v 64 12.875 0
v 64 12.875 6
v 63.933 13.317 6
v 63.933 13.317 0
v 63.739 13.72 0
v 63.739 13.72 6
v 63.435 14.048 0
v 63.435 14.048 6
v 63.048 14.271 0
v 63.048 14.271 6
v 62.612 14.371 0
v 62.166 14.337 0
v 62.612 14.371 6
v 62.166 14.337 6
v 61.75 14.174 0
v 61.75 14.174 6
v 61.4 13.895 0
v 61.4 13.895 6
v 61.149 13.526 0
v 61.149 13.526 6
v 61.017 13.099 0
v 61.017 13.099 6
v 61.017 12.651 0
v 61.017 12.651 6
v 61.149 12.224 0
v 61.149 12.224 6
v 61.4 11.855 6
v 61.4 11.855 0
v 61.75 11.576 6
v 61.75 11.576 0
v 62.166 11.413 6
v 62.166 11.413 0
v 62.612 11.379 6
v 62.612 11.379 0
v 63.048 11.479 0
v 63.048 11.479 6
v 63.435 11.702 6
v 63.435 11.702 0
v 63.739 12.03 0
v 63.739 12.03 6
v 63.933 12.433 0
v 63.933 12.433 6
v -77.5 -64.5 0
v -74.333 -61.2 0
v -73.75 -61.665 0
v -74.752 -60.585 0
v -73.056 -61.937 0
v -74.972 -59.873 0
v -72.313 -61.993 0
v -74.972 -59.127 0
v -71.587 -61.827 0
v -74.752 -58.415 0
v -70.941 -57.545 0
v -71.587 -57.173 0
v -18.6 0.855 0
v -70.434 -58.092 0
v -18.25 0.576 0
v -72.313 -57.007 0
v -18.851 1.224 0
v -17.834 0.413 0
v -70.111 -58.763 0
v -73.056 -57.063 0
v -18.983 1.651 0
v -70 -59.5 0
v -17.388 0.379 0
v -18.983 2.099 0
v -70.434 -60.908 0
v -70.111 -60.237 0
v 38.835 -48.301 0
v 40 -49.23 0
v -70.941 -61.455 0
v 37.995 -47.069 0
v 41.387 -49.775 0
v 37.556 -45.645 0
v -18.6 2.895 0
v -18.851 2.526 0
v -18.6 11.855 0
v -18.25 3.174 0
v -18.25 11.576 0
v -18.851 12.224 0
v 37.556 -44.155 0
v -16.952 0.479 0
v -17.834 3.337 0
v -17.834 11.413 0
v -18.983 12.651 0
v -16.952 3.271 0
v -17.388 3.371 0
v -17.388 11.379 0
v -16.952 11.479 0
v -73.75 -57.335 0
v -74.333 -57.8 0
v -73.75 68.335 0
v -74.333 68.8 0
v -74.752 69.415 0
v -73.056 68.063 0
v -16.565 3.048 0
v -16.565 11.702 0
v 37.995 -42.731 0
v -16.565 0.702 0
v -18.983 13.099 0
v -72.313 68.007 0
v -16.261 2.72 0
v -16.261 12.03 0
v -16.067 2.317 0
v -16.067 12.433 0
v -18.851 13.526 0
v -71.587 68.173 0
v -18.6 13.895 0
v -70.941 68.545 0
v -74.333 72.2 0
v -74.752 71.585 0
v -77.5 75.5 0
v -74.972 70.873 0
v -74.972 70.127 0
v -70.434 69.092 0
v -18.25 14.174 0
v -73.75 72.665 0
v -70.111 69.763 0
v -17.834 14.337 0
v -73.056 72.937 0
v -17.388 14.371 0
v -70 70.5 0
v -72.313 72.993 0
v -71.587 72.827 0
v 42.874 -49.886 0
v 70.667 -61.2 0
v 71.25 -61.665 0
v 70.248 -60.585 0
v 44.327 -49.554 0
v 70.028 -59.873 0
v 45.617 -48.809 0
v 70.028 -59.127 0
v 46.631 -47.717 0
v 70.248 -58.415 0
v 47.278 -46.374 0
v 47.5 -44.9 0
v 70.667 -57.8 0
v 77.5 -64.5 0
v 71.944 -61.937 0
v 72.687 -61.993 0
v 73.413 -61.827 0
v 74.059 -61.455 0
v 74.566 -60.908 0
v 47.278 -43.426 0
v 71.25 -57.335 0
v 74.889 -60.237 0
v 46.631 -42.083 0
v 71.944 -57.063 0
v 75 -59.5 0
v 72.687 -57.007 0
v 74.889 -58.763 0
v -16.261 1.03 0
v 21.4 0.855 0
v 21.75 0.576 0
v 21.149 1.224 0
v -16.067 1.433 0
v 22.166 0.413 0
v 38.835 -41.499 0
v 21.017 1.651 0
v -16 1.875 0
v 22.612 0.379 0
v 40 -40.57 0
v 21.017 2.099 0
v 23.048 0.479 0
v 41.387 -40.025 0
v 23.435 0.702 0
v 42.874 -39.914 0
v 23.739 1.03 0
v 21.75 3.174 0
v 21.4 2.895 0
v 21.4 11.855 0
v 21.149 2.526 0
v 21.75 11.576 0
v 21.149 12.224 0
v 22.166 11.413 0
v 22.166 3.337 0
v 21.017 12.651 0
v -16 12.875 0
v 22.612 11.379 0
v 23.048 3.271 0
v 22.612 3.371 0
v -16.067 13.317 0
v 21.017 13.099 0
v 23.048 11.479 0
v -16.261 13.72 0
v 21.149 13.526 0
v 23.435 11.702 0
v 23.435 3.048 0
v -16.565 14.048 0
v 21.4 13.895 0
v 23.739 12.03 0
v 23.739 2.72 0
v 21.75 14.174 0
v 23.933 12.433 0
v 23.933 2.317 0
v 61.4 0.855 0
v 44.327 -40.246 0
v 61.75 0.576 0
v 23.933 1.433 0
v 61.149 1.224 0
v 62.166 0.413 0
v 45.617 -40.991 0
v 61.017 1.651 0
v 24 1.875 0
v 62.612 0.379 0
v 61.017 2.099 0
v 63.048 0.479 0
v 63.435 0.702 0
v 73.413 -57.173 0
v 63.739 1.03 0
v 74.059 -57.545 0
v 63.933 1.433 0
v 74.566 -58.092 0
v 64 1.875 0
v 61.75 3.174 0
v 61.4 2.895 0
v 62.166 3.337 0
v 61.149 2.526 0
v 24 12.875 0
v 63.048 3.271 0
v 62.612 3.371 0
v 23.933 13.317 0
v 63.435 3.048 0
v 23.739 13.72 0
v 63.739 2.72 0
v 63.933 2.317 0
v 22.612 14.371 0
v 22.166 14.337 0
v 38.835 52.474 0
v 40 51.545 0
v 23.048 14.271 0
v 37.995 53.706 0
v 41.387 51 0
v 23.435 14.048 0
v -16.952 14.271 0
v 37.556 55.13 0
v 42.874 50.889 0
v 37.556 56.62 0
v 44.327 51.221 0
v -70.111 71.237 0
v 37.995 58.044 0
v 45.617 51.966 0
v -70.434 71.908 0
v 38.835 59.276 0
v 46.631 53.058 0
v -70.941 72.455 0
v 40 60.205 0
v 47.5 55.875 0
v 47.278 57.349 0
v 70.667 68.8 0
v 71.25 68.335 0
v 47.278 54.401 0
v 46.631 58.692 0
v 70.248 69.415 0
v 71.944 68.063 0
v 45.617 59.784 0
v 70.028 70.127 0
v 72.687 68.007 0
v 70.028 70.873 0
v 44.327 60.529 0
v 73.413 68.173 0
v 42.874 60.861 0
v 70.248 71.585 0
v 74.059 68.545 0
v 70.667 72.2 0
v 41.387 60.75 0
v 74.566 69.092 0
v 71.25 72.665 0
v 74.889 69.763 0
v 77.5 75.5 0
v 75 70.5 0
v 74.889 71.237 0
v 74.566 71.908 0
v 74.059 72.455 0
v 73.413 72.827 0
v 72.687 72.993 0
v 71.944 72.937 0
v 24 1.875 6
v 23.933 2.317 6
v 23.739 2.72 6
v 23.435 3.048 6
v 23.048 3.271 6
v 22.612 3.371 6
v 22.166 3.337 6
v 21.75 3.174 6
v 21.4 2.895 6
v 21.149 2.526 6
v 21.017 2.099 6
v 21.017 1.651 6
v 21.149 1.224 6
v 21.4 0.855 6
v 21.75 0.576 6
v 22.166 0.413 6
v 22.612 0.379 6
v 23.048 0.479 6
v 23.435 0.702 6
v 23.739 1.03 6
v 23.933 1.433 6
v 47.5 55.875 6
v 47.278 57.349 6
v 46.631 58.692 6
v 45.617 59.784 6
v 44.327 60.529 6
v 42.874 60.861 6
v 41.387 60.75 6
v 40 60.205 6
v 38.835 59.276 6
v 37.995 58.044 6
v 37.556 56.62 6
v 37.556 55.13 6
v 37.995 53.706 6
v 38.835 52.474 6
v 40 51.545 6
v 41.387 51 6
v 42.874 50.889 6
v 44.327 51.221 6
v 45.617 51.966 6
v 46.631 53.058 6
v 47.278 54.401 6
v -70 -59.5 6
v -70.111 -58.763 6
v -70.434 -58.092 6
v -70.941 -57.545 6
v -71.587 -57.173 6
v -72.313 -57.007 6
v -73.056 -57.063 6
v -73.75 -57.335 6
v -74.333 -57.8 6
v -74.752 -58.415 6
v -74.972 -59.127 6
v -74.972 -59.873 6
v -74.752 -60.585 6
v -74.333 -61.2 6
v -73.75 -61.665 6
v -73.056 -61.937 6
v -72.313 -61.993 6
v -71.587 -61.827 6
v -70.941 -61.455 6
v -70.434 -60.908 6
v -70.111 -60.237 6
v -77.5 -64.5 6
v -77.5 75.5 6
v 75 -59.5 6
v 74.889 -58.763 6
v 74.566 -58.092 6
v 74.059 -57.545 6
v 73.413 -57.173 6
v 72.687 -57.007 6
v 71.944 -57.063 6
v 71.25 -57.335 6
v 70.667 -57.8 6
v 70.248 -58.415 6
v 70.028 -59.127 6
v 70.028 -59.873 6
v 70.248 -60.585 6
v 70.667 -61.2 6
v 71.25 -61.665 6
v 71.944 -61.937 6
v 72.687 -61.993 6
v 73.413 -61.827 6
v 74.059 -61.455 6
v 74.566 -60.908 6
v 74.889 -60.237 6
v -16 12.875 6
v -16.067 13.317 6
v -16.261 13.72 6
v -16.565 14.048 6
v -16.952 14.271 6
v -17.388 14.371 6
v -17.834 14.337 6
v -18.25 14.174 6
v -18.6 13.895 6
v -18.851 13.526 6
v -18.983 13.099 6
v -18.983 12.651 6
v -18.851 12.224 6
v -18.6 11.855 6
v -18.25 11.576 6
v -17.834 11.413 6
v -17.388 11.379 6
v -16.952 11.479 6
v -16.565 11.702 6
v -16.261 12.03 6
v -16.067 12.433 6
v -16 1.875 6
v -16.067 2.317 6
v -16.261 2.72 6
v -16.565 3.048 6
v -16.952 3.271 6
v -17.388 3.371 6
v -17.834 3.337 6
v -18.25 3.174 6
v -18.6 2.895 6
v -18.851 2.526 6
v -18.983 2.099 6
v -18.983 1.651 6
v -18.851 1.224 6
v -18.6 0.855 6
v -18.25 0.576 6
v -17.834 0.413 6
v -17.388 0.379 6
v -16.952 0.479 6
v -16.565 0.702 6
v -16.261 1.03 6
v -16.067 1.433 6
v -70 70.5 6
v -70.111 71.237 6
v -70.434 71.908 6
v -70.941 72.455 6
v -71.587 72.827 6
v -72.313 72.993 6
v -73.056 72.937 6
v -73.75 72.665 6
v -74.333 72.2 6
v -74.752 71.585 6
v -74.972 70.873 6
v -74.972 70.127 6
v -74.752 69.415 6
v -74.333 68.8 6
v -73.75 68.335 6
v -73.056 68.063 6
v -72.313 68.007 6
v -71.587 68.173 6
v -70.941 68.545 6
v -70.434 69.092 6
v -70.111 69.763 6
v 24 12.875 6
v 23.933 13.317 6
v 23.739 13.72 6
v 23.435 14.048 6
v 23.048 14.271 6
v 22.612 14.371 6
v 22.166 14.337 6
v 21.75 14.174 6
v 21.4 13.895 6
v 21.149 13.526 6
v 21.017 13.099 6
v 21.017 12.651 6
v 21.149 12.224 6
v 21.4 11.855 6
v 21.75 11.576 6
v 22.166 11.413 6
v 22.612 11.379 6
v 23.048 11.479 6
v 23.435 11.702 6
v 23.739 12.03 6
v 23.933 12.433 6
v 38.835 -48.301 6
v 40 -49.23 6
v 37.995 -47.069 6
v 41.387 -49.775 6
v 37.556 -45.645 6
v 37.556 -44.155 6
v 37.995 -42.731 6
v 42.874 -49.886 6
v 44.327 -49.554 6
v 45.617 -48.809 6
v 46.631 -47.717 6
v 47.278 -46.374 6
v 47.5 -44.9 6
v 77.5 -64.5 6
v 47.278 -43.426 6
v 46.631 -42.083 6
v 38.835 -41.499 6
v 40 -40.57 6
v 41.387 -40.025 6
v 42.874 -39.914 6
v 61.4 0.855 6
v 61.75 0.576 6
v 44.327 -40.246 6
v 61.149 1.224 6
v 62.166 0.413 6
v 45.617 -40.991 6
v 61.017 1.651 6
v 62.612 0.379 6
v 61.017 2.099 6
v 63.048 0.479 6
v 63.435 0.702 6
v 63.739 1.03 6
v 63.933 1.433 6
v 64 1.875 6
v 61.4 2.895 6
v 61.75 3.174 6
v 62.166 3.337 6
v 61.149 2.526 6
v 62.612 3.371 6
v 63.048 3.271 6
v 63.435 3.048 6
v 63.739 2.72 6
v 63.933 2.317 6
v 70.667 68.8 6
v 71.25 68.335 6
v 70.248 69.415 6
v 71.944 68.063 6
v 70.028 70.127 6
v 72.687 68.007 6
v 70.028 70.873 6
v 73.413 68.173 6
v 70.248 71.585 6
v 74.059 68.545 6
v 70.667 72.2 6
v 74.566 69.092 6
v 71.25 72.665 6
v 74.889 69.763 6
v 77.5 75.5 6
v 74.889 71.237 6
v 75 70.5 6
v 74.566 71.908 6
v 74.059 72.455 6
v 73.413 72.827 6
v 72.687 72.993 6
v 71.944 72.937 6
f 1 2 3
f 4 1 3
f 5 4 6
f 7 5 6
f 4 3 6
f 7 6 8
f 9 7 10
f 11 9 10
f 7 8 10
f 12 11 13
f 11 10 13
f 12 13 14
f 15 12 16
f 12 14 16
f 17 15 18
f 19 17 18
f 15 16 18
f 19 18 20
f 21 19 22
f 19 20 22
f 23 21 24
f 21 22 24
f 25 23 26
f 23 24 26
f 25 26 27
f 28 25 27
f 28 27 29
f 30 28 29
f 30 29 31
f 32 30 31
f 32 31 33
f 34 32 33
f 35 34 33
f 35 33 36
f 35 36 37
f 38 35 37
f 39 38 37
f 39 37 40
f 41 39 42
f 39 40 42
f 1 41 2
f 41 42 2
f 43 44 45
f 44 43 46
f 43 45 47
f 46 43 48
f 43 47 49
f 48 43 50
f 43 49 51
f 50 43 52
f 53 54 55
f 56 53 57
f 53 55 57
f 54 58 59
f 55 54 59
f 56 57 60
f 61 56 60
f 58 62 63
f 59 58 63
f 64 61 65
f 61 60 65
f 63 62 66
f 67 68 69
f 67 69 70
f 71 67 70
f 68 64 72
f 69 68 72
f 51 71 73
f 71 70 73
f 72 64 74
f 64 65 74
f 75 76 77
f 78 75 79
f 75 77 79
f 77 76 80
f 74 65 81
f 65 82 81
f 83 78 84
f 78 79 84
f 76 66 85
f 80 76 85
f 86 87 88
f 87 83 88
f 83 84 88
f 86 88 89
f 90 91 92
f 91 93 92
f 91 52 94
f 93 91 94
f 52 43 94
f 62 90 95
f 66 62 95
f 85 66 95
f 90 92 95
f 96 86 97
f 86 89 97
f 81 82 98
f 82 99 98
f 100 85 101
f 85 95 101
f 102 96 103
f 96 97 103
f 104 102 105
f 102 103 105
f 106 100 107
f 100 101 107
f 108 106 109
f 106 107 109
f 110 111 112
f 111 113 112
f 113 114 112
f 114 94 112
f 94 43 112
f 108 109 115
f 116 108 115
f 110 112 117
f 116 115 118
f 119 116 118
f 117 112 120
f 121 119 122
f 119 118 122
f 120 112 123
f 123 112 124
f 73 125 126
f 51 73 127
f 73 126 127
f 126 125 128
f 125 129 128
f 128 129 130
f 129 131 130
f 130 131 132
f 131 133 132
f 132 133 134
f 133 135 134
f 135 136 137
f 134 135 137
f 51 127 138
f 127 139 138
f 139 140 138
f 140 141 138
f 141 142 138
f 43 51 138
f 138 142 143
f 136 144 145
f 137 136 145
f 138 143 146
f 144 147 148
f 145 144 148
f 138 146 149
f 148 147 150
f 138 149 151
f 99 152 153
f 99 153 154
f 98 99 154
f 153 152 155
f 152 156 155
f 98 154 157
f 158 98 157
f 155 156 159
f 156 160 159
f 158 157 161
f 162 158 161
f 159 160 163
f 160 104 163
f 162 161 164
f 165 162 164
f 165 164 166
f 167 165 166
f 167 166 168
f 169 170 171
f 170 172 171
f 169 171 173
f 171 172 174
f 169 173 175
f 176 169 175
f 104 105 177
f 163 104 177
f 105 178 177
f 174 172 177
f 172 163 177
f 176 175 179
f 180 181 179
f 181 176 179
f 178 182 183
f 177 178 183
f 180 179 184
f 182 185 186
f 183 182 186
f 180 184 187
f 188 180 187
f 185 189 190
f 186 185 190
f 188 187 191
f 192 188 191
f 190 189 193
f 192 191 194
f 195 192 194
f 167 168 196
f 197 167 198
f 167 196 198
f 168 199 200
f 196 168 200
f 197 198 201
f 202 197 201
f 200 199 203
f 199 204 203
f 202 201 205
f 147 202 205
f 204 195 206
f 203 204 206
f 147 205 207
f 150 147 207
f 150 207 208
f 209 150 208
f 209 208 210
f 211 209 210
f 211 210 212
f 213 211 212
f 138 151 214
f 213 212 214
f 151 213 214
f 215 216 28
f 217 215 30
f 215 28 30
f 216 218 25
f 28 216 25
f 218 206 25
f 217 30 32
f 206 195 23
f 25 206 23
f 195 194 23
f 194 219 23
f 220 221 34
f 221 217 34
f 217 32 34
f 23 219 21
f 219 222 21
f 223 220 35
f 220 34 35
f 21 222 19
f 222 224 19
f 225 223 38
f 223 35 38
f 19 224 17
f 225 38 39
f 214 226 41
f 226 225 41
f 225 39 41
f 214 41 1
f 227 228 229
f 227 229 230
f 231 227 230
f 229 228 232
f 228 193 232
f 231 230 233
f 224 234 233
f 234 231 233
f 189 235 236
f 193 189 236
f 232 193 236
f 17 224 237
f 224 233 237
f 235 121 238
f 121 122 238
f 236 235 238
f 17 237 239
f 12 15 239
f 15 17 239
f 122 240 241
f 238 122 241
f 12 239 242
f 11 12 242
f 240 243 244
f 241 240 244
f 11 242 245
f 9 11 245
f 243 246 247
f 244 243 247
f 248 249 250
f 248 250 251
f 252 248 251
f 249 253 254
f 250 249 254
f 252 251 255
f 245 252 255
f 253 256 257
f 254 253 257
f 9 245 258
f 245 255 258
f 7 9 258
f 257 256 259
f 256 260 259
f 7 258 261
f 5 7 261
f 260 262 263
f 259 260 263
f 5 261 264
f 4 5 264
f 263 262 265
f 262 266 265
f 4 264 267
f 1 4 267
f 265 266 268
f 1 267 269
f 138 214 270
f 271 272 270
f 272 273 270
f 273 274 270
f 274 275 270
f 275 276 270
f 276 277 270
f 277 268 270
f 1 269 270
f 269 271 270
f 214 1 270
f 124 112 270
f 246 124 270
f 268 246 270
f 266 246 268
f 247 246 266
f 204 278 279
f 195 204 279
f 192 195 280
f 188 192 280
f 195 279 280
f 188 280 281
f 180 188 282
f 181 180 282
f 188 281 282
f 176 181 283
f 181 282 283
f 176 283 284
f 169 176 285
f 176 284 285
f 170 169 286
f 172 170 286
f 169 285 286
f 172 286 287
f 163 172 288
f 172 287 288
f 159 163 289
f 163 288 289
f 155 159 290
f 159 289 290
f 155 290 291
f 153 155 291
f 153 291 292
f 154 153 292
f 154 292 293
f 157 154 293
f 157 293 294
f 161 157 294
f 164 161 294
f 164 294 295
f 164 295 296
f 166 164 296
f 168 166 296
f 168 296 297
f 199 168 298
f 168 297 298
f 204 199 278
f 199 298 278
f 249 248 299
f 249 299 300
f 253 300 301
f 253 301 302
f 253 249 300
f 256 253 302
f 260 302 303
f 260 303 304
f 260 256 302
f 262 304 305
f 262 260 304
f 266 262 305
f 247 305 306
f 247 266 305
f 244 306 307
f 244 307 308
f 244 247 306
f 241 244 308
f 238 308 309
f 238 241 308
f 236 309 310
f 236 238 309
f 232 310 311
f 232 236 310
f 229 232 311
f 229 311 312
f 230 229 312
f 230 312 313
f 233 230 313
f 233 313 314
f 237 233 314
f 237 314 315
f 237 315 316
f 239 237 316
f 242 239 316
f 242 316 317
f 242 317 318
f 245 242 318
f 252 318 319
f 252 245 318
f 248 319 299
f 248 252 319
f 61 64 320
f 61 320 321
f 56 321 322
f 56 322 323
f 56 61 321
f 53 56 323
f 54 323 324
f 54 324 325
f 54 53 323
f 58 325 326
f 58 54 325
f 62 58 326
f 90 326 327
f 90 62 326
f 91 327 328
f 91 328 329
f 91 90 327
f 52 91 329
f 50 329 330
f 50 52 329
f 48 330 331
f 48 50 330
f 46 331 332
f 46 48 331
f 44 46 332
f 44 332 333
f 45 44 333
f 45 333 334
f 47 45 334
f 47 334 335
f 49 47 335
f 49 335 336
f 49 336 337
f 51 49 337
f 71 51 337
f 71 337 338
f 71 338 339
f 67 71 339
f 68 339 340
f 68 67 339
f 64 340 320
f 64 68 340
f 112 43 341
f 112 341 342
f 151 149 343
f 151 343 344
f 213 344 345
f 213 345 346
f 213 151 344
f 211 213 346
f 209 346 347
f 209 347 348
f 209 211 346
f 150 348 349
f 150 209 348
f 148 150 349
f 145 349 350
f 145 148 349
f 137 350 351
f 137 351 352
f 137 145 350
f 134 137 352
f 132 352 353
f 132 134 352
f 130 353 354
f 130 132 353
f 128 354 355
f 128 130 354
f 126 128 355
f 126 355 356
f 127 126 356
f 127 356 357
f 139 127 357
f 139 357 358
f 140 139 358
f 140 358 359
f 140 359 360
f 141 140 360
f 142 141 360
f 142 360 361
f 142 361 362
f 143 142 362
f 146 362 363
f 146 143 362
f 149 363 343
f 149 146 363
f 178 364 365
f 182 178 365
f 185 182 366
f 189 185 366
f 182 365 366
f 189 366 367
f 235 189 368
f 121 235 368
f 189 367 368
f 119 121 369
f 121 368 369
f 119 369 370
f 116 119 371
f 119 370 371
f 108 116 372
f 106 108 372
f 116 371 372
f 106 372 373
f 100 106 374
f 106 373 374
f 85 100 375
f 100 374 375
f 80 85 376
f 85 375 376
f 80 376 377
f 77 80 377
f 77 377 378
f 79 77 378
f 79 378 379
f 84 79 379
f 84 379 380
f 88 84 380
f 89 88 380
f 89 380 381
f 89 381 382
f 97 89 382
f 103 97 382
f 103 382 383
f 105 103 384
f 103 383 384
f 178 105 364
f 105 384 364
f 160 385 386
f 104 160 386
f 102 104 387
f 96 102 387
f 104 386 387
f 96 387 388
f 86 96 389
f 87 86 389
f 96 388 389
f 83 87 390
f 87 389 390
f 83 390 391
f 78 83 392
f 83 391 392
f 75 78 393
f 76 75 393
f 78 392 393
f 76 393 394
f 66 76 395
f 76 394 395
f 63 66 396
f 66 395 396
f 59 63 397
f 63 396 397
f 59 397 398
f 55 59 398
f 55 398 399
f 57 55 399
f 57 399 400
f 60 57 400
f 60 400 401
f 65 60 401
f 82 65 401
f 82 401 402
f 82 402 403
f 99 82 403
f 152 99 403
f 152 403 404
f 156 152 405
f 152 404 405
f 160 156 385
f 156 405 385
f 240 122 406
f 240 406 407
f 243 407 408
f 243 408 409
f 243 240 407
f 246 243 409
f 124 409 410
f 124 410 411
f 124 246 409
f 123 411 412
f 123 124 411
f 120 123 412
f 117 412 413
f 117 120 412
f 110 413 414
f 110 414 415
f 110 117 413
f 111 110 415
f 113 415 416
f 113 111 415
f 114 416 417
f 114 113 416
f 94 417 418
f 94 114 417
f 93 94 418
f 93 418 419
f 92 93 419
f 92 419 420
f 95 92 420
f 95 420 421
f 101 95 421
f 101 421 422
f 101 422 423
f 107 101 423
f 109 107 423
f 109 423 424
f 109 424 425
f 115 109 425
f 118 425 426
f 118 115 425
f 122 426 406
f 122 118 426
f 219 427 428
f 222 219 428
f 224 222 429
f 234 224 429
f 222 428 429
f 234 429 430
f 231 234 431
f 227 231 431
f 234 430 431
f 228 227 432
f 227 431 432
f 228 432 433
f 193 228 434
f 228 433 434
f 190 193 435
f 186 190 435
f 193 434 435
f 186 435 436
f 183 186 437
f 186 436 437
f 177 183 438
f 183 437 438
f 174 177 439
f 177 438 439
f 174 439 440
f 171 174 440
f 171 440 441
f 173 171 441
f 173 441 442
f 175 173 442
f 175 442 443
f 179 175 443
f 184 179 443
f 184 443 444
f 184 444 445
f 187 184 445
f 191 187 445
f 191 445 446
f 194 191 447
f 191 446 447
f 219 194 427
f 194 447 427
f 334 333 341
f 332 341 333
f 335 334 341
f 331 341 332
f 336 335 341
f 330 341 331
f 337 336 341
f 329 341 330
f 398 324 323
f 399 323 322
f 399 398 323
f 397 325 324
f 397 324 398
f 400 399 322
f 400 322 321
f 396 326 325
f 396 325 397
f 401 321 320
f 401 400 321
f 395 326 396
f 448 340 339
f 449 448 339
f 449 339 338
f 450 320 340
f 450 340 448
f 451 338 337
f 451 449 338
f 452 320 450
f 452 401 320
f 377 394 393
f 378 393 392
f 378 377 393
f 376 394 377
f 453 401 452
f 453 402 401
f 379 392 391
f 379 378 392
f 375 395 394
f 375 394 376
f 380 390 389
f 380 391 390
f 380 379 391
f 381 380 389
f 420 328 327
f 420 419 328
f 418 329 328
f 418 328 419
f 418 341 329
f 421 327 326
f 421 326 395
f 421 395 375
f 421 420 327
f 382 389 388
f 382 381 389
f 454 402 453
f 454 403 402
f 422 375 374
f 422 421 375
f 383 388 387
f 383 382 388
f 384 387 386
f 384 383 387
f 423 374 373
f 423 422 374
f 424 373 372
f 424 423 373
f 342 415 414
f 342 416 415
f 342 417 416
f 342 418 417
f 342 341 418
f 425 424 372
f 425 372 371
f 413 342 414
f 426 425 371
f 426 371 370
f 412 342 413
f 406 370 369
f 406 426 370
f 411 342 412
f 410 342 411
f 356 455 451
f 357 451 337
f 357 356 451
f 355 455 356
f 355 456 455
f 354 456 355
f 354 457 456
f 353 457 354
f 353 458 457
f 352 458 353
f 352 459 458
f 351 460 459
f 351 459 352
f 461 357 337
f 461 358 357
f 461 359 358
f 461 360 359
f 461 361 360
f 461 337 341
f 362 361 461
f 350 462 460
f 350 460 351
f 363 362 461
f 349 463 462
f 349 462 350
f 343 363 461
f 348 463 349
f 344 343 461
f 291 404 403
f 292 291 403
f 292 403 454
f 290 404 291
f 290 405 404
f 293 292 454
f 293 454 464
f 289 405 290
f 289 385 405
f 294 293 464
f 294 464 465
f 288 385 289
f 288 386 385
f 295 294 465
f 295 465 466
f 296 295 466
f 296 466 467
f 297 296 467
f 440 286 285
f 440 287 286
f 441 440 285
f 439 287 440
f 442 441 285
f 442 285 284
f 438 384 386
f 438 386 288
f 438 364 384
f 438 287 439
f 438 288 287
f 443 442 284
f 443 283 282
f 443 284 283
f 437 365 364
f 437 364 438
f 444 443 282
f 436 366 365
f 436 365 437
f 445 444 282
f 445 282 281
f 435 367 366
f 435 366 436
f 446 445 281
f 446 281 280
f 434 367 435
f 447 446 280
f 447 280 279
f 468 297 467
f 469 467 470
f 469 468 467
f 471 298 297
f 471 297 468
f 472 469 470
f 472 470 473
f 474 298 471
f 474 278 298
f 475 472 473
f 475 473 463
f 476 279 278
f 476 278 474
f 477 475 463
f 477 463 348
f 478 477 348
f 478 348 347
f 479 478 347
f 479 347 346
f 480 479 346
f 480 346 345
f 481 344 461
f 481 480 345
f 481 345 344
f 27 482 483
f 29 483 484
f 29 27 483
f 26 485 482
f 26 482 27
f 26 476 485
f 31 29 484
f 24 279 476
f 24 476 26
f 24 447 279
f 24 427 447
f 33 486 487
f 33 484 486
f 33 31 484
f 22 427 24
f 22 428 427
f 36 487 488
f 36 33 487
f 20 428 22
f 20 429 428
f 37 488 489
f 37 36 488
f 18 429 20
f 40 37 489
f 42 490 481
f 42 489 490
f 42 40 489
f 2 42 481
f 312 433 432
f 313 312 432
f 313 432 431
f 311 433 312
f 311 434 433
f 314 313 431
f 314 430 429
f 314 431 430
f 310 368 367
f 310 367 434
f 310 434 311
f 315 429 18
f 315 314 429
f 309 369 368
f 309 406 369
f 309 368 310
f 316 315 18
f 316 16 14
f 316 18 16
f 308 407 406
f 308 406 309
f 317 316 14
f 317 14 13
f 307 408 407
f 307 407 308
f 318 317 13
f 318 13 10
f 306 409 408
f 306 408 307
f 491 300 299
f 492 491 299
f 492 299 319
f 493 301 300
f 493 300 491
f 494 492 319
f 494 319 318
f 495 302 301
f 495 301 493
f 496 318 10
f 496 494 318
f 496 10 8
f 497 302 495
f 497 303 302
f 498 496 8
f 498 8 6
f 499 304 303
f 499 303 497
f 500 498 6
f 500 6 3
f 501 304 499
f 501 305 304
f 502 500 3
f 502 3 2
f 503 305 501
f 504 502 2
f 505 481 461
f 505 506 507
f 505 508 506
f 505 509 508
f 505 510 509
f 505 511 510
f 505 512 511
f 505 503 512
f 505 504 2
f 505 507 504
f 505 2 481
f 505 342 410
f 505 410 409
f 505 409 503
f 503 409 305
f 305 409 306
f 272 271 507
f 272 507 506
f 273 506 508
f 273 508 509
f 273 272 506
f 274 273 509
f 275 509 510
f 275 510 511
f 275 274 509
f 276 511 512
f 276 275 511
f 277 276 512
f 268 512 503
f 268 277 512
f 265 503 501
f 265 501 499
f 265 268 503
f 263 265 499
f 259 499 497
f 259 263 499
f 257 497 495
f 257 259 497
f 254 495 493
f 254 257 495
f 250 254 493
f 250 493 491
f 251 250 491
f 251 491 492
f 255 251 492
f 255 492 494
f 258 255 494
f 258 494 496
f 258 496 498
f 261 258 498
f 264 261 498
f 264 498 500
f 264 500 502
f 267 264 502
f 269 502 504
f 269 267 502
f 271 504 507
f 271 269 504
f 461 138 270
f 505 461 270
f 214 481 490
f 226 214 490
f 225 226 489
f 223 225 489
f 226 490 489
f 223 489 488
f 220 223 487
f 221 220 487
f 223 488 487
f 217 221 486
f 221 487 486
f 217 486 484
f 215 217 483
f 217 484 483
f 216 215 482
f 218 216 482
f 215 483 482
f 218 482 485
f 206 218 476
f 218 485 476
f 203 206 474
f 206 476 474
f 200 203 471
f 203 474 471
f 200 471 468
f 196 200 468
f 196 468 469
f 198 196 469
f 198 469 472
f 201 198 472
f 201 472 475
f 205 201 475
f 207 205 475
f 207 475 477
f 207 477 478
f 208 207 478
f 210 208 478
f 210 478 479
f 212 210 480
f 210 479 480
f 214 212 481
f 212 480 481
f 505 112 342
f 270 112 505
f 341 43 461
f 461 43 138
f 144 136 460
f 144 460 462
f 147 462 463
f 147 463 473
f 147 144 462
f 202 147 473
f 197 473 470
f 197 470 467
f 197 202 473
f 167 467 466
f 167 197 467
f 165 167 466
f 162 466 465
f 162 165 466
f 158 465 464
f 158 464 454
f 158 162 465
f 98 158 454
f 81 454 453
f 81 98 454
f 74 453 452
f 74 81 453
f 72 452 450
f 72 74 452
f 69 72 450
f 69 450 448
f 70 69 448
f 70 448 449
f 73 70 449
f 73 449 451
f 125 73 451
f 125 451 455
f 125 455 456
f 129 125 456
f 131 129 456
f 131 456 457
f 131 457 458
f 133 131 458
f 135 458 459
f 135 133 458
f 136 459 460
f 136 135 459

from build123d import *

# Parameters (mm, degrees)
ESQUISSE1_W             = 155
ESQUISSE1_H             = 140
ESQUISSE1_R             = 5
ESQUISSE1_R_2           = 2.5
BOSS_EXTRU_1_DEPTH      = 6
ESQUISSE6_R             = 1.5
ENL_V_MAT_EXTRU_1_DEPTH = 6


with BuildPart() as part:
    # Esquisse1 → Boss.-Extru.1 (new body)
    with BuildSketch(Plane.XY):
        with Locations((0, 5.5)):
            Rectangle(ESQUISSE1_W, ESQUISSE1_H)
        with Locations((42.5, -44.9)):
            Circle(ESQUISSE1_R, mode=Mode.SUBTRACT)
        with Locations((42.5, 55.875)):
            Circle(ESQUISSE1_R, mode=Mode.SUBTRACT)
        with Locations((-72.5, -59.5)):
            Circle(ESQUISSE1_R_2, mode=Mode.SUBTRACT)
        with Locations((-72.5, 70.5)):
            Circle(ESQUISSE1_R_2, mode=Mode.SUBTRACT)
        with Locations((72.5, -59.5)):
            Circle(ESQUISSE1_R_2, mode=Mode.SUBTRACT)
        with Locations((72.5, 70.5)):
            Circle(ESQUISSE1_R_2, mode=Mode.SUBTRACT)
    extrude(amount=BOSS_EXTRU_1_DEPTH)

    # Esquisse6 → Enlèv. mat.-Extru.1 (cut)
    with BuildSketch(Plane.XY.offset(6)):
        with Locations((-17.5, 12.875)):
            Circle(ESQUISSE6_R)
        with Locations((22.5, 12.875)):
            Circle(ESQUISSE6_R)
        with Locations((62.5, 12.875)):
            Circle(ESQUISSE6_R)
        with Locations((62.5, 1.875)):
            Circle(ESQUISSE6_R)
        with Locations((22.5, 1.875)):
            Circle(ESQUISSE6_R)
        with Locations((-17.5, 1.875)):
            Circle(ESQUISSE6_R)
    extrude(amount=-ENL_V_MAT_EXTRU_1_DEPTH, mode=Mode.SUBTRACT)


solid = part.part
